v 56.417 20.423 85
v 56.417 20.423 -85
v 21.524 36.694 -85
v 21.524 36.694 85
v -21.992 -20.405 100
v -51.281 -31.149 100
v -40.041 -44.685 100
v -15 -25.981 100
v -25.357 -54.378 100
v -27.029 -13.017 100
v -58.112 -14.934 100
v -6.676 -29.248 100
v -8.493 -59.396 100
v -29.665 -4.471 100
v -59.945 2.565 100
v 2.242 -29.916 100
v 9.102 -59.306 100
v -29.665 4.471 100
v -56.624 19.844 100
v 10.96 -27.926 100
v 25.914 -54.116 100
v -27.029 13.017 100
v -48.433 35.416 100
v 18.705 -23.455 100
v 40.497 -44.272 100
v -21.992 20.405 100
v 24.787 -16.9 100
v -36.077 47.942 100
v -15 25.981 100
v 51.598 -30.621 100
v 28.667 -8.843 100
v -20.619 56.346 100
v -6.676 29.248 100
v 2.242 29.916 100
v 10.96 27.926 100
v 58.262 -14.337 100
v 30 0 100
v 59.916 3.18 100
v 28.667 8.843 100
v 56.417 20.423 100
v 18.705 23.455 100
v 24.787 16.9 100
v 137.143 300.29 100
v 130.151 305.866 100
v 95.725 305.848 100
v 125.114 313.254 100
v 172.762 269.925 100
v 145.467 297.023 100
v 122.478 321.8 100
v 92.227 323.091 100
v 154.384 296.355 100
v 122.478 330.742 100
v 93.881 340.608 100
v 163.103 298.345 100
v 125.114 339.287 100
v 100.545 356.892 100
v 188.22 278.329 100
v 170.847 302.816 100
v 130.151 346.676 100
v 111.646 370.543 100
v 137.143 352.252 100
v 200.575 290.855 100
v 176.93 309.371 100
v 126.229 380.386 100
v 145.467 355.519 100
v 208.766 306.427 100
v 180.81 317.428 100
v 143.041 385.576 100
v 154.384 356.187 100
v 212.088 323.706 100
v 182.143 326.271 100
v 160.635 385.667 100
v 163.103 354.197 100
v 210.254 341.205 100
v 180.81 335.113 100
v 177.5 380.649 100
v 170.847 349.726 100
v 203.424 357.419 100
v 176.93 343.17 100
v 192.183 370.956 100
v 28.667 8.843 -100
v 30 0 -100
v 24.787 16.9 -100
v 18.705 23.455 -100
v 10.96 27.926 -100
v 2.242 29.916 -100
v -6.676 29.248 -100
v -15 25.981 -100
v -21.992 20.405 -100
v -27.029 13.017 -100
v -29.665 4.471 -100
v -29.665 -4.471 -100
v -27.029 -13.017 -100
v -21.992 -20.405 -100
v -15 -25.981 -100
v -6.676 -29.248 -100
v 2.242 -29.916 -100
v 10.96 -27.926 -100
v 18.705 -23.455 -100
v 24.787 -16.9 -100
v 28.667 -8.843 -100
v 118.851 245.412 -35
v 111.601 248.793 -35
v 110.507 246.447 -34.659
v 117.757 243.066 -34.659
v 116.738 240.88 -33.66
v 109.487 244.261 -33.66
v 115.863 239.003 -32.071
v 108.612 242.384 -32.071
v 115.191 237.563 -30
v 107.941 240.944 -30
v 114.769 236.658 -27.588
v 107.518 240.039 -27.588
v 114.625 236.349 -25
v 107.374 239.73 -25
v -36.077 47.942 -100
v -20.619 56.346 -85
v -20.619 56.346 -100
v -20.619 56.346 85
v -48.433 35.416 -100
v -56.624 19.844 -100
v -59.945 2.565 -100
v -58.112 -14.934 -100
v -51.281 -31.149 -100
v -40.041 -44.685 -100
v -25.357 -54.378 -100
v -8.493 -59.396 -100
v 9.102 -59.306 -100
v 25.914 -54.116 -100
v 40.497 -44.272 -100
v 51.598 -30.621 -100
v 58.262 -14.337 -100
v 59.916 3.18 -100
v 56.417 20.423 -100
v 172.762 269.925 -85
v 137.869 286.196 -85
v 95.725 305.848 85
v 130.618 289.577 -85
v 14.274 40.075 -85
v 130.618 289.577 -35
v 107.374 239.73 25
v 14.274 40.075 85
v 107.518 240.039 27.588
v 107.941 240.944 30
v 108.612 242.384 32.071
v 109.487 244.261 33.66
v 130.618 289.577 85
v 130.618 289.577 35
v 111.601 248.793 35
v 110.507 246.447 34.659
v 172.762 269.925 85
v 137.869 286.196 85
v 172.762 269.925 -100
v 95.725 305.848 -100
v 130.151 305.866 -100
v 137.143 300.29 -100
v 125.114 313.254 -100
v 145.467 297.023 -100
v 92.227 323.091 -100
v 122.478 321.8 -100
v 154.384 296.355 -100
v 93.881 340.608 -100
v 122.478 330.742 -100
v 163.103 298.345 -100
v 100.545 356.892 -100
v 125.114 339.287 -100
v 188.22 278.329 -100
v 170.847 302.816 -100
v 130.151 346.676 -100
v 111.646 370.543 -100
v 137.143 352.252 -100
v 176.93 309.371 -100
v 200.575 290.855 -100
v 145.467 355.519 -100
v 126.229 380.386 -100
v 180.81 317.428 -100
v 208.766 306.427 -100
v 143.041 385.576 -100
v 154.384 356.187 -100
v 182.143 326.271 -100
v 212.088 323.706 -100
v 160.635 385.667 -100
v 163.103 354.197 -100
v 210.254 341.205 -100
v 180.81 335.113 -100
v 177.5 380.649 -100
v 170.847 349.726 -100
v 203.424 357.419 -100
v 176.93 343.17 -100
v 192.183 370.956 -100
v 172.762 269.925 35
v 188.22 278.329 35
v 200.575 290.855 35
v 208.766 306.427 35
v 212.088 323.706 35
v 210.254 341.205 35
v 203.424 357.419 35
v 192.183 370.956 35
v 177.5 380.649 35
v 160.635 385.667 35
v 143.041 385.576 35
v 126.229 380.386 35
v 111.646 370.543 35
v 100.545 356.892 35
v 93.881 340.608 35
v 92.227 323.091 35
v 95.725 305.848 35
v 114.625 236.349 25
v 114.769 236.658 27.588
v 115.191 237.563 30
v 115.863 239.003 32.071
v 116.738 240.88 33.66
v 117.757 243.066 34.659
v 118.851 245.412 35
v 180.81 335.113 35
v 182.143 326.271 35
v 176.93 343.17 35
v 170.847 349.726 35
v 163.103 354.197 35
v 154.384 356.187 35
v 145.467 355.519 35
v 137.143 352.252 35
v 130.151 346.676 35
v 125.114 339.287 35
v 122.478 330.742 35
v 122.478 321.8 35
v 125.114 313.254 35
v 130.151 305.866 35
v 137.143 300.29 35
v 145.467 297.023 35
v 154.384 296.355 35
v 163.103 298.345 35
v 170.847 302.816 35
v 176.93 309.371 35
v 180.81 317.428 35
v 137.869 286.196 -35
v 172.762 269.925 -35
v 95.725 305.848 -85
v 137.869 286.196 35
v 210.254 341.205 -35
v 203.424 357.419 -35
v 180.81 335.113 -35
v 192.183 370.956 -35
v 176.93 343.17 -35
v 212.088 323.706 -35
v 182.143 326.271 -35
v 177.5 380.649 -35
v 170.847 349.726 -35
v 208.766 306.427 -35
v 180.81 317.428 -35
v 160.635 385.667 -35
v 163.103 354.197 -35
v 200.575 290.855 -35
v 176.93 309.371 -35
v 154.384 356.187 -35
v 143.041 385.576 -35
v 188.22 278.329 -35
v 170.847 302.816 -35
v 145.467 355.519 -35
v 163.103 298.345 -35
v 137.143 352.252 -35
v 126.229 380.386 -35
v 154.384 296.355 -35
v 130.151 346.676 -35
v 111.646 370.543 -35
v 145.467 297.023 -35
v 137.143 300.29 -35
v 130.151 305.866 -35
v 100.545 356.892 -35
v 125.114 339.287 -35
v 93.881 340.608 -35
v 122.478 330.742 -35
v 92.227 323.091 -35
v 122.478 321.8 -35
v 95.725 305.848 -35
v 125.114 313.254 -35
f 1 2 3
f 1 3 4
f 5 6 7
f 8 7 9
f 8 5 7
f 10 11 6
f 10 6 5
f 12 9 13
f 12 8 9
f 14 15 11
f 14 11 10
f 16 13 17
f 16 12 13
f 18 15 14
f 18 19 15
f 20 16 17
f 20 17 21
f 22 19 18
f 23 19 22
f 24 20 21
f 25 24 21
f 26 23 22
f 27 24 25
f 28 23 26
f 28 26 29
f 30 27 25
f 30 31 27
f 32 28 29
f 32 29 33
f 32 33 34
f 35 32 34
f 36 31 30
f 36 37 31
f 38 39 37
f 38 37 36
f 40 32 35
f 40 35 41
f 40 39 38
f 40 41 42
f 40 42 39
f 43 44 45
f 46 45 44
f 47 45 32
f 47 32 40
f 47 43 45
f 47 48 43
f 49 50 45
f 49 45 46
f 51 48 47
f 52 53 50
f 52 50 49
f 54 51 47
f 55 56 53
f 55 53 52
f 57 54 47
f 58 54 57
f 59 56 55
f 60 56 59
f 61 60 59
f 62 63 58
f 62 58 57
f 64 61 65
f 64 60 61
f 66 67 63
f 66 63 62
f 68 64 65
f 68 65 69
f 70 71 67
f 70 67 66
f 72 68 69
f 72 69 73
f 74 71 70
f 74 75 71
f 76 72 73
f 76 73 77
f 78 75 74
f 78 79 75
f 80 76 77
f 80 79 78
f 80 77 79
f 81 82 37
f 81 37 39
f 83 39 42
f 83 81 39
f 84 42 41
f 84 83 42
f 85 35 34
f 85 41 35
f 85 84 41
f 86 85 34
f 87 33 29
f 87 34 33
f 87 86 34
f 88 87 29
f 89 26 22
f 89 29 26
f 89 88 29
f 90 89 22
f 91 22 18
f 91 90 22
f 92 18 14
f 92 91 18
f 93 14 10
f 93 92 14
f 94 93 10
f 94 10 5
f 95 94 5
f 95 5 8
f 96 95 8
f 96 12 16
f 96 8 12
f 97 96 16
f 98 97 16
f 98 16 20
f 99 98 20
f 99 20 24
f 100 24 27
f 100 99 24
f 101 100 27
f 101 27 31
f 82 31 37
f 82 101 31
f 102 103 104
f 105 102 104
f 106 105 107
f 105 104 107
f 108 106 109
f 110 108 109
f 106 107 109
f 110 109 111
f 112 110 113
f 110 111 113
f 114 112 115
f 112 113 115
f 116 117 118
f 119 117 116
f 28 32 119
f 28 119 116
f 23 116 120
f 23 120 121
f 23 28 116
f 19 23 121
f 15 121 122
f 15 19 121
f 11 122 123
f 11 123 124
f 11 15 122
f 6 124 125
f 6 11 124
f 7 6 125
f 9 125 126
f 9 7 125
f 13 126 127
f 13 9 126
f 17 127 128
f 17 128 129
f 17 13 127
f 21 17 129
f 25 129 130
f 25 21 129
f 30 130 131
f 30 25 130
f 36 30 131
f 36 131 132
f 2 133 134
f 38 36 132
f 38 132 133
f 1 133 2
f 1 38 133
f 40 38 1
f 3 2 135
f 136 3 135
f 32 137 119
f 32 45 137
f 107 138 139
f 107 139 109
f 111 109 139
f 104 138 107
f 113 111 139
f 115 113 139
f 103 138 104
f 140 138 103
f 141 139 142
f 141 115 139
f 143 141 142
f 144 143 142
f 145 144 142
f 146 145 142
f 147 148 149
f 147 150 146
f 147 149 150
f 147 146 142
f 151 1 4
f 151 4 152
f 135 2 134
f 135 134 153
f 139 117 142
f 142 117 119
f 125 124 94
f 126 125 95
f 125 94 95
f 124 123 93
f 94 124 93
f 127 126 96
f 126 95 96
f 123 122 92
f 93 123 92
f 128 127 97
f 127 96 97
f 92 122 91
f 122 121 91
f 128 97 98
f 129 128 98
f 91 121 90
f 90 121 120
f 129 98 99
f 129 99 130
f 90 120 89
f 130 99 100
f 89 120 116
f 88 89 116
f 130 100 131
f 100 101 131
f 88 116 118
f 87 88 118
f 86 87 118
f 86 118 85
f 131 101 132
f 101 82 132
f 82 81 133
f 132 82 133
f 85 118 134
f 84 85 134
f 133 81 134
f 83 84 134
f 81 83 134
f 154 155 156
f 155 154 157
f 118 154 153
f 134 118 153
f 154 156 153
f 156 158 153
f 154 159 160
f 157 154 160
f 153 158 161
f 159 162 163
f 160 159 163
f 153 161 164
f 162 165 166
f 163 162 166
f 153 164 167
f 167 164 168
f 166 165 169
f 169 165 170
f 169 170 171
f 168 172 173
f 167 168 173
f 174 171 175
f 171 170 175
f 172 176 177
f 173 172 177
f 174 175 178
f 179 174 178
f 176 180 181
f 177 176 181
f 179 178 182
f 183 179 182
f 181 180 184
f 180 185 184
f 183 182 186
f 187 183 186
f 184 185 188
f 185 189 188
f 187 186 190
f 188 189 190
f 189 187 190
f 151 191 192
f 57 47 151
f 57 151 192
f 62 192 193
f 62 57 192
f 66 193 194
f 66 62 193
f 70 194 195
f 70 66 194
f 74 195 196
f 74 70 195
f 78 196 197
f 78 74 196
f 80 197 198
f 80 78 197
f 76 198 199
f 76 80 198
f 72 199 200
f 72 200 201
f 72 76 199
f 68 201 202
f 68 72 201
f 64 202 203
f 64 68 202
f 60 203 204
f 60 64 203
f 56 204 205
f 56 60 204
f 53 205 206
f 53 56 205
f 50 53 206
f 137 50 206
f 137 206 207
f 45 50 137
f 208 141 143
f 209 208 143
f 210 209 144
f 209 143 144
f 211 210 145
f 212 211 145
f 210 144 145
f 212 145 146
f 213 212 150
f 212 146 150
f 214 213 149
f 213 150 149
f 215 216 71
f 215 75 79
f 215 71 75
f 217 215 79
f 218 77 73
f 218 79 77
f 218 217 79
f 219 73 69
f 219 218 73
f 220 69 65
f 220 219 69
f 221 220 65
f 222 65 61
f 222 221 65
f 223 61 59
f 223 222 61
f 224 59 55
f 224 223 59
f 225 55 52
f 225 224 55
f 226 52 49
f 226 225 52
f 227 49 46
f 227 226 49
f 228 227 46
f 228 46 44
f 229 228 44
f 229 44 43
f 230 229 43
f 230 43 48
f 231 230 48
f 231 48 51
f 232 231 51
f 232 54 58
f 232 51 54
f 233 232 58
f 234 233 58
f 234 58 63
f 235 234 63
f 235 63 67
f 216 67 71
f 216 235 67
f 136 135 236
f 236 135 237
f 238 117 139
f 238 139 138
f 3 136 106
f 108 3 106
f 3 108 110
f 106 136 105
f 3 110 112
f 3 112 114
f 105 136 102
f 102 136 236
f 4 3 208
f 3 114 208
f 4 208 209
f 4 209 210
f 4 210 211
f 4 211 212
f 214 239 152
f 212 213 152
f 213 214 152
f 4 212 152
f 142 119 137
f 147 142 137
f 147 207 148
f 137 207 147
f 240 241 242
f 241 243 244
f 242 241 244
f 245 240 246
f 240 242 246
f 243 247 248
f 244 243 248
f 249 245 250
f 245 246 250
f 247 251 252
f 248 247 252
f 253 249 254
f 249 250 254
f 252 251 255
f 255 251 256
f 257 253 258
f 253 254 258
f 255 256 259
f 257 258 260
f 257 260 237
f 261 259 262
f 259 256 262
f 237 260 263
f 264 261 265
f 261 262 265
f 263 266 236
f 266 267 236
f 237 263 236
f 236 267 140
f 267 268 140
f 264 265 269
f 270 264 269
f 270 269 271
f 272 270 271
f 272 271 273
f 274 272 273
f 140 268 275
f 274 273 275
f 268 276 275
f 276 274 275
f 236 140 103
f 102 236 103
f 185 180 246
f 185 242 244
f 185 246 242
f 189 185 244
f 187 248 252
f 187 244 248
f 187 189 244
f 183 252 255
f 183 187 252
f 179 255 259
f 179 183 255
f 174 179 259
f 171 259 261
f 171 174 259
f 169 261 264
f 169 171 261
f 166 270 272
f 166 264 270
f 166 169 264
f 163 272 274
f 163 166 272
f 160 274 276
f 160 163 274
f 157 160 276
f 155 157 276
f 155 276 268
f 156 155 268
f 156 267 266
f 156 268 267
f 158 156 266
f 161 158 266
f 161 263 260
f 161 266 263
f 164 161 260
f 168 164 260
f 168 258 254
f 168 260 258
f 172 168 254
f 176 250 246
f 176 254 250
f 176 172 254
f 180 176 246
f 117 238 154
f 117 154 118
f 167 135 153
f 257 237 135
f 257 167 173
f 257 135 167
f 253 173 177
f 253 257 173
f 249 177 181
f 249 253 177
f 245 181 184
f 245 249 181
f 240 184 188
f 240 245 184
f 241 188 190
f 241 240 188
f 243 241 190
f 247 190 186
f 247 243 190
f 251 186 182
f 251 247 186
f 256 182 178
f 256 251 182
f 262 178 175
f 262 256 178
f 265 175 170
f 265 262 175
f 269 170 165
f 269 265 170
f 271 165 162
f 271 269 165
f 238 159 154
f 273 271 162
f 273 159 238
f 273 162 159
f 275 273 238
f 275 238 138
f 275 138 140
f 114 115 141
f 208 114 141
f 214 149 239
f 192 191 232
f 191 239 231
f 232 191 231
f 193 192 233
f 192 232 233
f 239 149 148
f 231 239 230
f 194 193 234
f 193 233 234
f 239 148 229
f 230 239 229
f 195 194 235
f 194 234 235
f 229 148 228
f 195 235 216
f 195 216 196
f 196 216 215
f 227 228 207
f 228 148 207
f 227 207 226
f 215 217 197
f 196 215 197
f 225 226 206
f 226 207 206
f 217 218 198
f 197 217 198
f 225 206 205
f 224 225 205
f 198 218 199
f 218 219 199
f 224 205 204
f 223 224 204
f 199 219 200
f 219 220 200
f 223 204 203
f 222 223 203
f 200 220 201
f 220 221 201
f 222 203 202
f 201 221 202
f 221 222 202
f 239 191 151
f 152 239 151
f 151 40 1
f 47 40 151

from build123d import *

# Parameters (mm, degrees)
BOSS_EXTRUDE1_DEPTH     = 100
CUT_EXTRUDE1_DEPTH      = 452.895569028
CUT_EXTRUDE1_DEPTH_BACK = 452.895569028
SKETCH2_R               = 30
SKETCH9_R               = 60
CUT_EXTRUDE4_DEPTH      = 35
CUT_EXTRUDE5_DEPTH      = 457.59902747
SKETCH12_W              = 170
SKETCH12_H              = 275.29462827
CUT_EXTRUDE6_DEPTH      = 38.5


with BuildPart() as part:
    # Sketch1 → Boss-Extrude1 (new, symmetric)
    with BuildSketch(Plane.XY):
        with BuildLine():
            Line((56.417099429, 20.423292878), (172.761636695, 269.924958208))
            ThreePointArc((172.761636695, 269.924958208), (177.499669931, 380.649270555), (95.725474797, 305.847510456))
            Line((95.725474797, 305.847510456), (-20.619062469, 56.345845126))
            ThreePointArc((-20.619062469, 56.345845126), (-25.357095704, -54.378467222), (56.417099429, 20.423292878))
        make_face()
    extrude(amount=BOSS_EXTRUDE1_DEPTH, both=True)

    # Sketch2 → Cut-Extrude1 (cut, two sides: drawn at the far end of the back side and taken through both)
    with BuildSketch(Plane.XY.offset(-CUT_EXTRUDE1_DEPTH_BACK)):
        Circle(SKETCH2_R)
        with Locations((152.142574227, 326.270803333)):
            Circle(SKETCH2_R)
    extrude(amount=CUT_EXTRUDE1_DEPTH + CUT_EXTRUDE1_DEPTH_BACK, mode=Mode.SUBTRACT)

    # Sketch9 → Cut-Extrude4 (cut, symmetric)
    with BuildSketch(Plane.XY):
        with Locations((152.142574227, 326.270803333)):
            Circle(SKETCH9_R)
    extrude(amount=CUT_EXTRUDE4_DEPTH, both=True, mode=Mode.SUBTRACT)

    # Sketch10 → Cut-Extrude5 (cut, through all)
    with BuildSketch(Plane(origin=(-38.518080949, 17.961276124, 0), x_dir=(0, 0, 1), z_dir=(-0.906307787036651, 0.42261826174069733, 0))):
        with BuildLine():
            Line((-35, 317.647314135), (-35, 272.647314135))
            ThreePointArc((-35, 272.647314135), (-32.071067812, 265.576246323), (-25, 262.647314135))
            Line((-25, 262.647314135), (0, 262.647314135))
            Line((0, 262.647314135), (25, 262.647314135))
            ThreePointArc((25, 262.647314135), (32.071067812, 265.576246323), (35, 272.647314135))
            Line((35, 272.647314135), (35, 317.647314135))
            Line((35, 317.647314135), (-35, 317.647314135))
        make_face()
    extrude(amount=-CUT_EXTRUDE5_DEPTH, mode=Mode.SUBTRACT)

    # Sketch12 → Cut-Extrude6 (cut)
    with BuildSketch(Plane(origin=(-38.518080949, 17.961276124, 0), x_dir=(0, 0, 1), z_dir=(-0.906307787036651, 0.42261826174069733, 0))):
        with Locations((0, 180)):
            Rectangle(SKETCH12_W, SKETCH12_H)
    cut_extrude6 = extrude(amount=-CUT_EXTRUDE6_DEPTH, mode=Mode.SUBTRACT)

    # Mirror1: Cut-Extrude6 across plane
    add(cut_extrude6.mirror(Plane(origin=(0, 0, 0), x_dir=(0, 0, 1), z_dir=(-0.906307787036651, 0.42261826174069733, 0))), mode=Mode.SUBTRACT)


solid = part.part
